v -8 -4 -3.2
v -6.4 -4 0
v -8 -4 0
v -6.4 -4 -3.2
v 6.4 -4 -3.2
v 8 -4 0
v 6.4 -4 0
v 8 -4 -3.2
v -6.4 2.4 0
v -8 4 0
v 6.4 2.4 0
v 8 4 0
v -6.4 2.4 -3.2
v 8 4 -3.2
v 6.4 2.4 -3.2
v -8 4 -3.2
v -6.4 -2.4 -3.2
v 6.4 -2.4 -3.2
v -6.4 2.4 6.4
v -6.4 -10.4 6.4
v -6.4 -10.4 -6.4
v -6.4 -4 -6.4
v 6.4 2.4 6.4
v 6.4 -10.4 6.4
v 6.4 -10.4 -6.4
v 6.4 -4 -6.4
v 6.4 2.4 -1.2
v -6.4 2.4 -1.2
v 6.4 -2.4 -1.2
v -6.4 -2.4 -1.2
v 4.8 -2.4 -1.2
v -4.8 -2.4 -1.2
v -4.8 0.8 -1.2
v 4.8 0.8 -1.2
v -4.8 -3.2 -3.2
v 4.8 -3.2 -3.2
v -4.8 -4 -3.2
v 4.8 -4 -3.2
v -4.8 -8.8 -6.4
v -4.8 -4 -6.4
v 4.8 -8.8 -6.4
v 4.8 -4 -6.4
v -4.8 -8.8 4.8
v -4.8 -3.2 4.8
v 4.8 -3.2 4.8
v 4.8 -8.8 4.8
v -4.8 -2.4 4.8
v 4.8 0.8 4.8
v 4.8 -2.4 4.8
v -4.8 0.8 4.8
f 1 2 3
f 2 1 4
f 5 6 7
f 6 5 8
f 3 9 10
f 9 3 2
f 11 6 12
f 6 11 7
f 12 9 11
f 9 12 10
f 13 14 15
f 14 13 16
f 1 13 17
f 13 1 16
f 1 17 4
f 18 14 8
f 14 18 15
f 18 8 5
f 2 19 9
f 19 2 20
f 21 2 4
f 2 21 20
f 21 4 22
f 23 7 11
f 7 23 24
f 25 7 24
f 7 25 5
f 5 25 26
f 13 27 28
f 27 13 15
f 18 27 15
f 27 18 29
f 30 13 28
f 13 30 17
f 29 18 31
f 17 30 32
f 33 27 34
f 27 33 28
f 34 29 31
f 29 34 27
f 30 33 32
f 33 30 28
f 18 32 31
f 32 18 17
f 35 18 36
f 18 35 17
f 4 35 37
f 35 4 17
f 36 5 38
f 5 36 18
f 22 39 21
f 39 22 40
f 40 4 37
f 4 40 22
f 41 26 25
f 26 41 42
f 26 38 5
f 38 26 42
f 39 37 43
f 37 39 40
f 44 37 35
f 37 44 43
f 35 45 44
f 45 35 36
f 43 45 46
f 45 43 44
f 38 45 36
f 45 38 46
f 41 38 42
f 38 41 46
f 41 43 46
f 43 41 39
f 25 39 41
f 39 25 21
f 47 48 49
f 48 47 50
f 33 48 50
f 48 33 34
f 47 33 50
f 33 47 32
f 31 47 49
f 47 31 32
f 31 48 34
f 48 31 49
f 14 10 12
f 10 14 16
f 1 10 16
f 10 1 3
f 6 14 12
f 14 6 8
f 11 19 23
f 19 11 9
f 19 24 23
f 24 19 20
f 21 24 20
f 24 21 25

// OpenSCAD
// file: ../p/rect3.scad
use <../lib.scad>
function ldraw_lib__rect3() = [
// 0 Rectangle with 3 Edges
// 0 Name: rect3.dat
// 0 Author: Mark Kennedy [mkennedy]
// 0 !LDRAW_ORG Primitive UPDATE 2010-01
// 0 !LICENSE Licensed under CC BY 2.0 and CC BY 4.0 : see CAreadme.txt
// 
// 0 BFC CERTIFY CCW
  [0,"BFC","CERTIFY"],
  [0,"BFC","CCW"],
// 
// 0 !HISTORY 2003-08-01 [PTadmin] Official Update 2003-02
// 0 !HISTORY 2007-06-24 [PTadmin] Header formatted for Contributor Agreement
// 0 !HISTORY 2008-07-01 [PTadmin] Official Update 2008-01
// 0 !HISTORY 2010-01-17 [mikeheide] Change winding to CCW
// 0 !HISTORY 2010-04-05 [PTadmin] Official Update 2010-01
// 
// 
// 2 24 1 0 1 -1 0 1
  [2,24,1,0,1,-1,0,1],
// 2 24 1 0 1 1 0 -1
  [2,24,1,0,1,1,0,-1],
// 2 24 -1 0 1 -1 0 -1
  [2,24,-1,0,1,-1,0,-1],
// 4 16 -1 0 1 -1 0 -1 1 0 -1 1 0 1
  [4,16,-1,0,1,-1,0,-1,1,0,-1,1,0,1],
// 0 //
];
module ldraw_lib__rect3(step=0, col=false, unit=2/5, alt=false, line=0.2, solid=!$preview)
    makepoly(ldraw_lib__rect3(), step=step, col=col, unit=unit, alt=alt, line=line, solid=solid);
ldraw_lib__rect3(line=0.2);
// file: ../p/rect.scad
use <../lib.scad>
function ldraw_lib__rect() = [
// 0 Rectangle
// 0 Name: rect.dat
// 0 Author: James Jessiman
// 0 !LDRAW_ORG Primitive UPDATE 2010-01
// 0 !LICENSE Licensed under CC BY 2.0 and CC BY 4.0 : see CAreadme.txt
// 
// 0 BFC CERTIFY CCW
  [0,"BFC","CERTIFY"],
  [0,"BFC","CCW"],
// 
// 0 !HISTORY 2002-04-05 [hafhead] Added BFC statement
// 0 !HISTORY 2002-04-25 [PTadmin] Official Update 2002-02
// 0 !HISTORY 2007-06-24 [PTadmin] Header formatted for Contributor Agreement
// 0 !HISTORY 2008-07-01 [PTadmin] Official Update 2008-01
// 0 !HISTORY 2010-01-17 [mikeheide] changed winding to CCW
// 0 !HISTORY 2010-04-05 [PTadmin] Official Update 2010-01
// 
// 
// 2 24 1 0 1 -1 0 1
  [2,24,1,0,1,-1,0,1],
// 2 24 -1 0 1 -1 0 -1
  [2,24,-1,0,1,-1,0,-1],
// 2 24 -1 0 -1 1 0 -1
  [2,24,-1,0,-1,1,0,-1],
// 2 24 1 0 -1 1 0 1
  [2,24,1,0,-1,1,0,1],
// 4 16 -1 0 1 -1 0 -1 1 0 -1 1 0 1
  [4,16,-1,0,1,-1,0,-1,1,0,-1,1,0,1],
// 0
];
module ldraw_lib__rect(step=0, col=false, unit=2/5, alt=false, line=0.2, solid=!$preview)
    makepoly(ldraw_lib__rect(), step=step, col=col, unit=unit, alt=alt, line=line, solid=solid);
ldraw_lib__rect(line=0.2);
// file: ../p/box5-1.scad
use <../lib.scad>
function ldraw_lib__box5_1() = [
// 0 Box with 5 Faces without 1 Edge
// 0 Name: box5-1.dat
// 0 Author: J.C. Tchang [tchang]
// 0 !LDRAW_ORG Primitive UPDATE 2014-01
// 0 !LICENSE Licensed under CC BY 2.0 and CC BY 4.0 : see CAreadme.txt
// 
// 0 BFC CERTIFY CCW
  [0,"BFC","CERTIFY"],
  [0,"BFC","CCW"],
// 
// 0 !HISTORY 2014-06-21 [PTadmin] Official Update 2014-01
// 
// 
// 2 24 1 1 1 -1 1 1
  [2,24,1,1,1,-1,1,1],
// 2 24 -1 1 1 -1 1 -1
  [2,24,-1,1,1,-1,1,-1],
// 2 24 -1 1 -1 1 1 -1
  [2,24,-1,1,-1,1,1,-1],
// 2 24 1 1 -1 1 1 1
  [2,24,1,1,-1,1,1,1],
// 2 24 1 0 1 -1 0 1
  [2,24,1,0,1,-1,0,1],
// 2 24 -1 0 1 -1 0 -1
  [2,24,-1,0,1,-1,0,-1],
// 2 24 1 0 -1 1 0 1
  [2,24,1,0,-1,1,0,1],
// 2 24 1 0 1 1 1 1
  [2,24,1,0,1,1,1,1],
// 2 24 -1 0 1 -1 1 1
  [2,24,-1,0,1,-1,1,1],
// 2 24 1 0 -1 1 1 -1
  [2,24,1,0,-1,1,1,-1],
// 2 24 -1 0 -1 -1 1 -1
  [2,24,-1,0,-1,-1,1,-1],
// 4 16 -1 1 1 1 1 1 1 1 -1 -1 1 -1
  [4,16,-1,1,1,1,1,1,1,1,-1,-1,1,-1],
// 4 16 -1 1 1 -1 0 1 1 0 1 1 1 1
  [4,16,-1,1,1,-1,0,1,1,0,1,1,1,1],
// 4 16 -1 1 -1 -1 0 -1 -1 0 1 -1 1 1
  [4,16,-1,1,-1,-1,0,-1,-1,0,1,-1,1,1],
// 4 16 1 1 -1 1 0 -1 -1 0 -1 -1 1 -1
  [4,16,1,1,-1,1,0,-1,-1,0,-1,-1,1,-1],
// 4 16 1 1 1 1 0 1 1 0 -1 1 1 -1
  [4,16,1,1,1,1,0,1,1,0,-1,1,1,-1],
];
module ldraw_lib__box5_1(step=0, col=false, unit=2/5, alt=false, line=0.2, solid=!$preview)
    makepoly(ldraw_lib__box5_1(), step=step, col=col, unit=unit, alt=alt, line=line, solid=solid);
ldraw_lib__box5_1(line=0.2);
// file: ../p/box3u2p.scad
use <../lib.scad>
function ldraw_lib__box3u2p() = [
// 0 Box with 3 Faces without 2 Parallel Edges
// 0 Name: box3u2p.dat
// 0 Author: Niels Karsdorp [nielsk]
// 0 !LDRAW_ORG Primitive UPDATE 2012-01
// 0 !LICENSE Licensed under CC BY 2.0 and CC BY 4.0 : see CAreadme.txt
// 
// 0 BFC CERTIFY CCW
  [0,"BFC","CERTIFY"],
  [0,"BFC","CCW"],
// 
// 0 !HISTORY 2003-03-12 [PTadmin] Official Update 2003-01
// 0 !HISTORY 2007-06-24 [PTadmin] Header formatted for Contributor Agreement
// 0 !HISTORY 2008-07-01 [PTadmin] Official Update 2008-01
// 0 !HISTORY 2012-02-16 [Philo] Changed to CCW
// 0 !HISTORY 2012-03-30 [PTadmin] Official Update 2012-01
// 
// 
// 2 24 1 1 1 -1 1 1
  [2,24,1,1,1,-1,1,1],
// 2 24 -1 1 -1 1 1 -1
  [2,24,-1,1,-1,1,1,-1],
// 2 24 1 0 1 -1 0 1
  [2,24,1,0,1,-1,0,1],
// 2 24 -1 0 -1 1 0 -1
  [2,24,-1,0,-1,1,0,-1],
// 2 24 1 1 1 1 1 -1
  [2,24,1,1,1,1,1,-1],
// 2 24 -1 1 1 -1 1 -1
  [2,24,-1,1,1,-1,1,-1],
// 2 24 1 1 1 1 0 1
  [2,24,1,1,1,1,0,1],
// 2 24 1 1 -1 1 0 -1
  [2,24,1,1,-1,1,0,-1],
// 2 24 -1 1 1 -1 0 1
  [2,24,-1,1,1,-1,0,1],
// 2 24 -1 1 -1 -1 0 -1
  [2,24,-1,1,-1,-1,0,-1],
// 4 16 -1 1 -1 -1 1 1 1 1 1 1 1 -1
  [4,16,-1,1,-1,-1,1,1,1,1,1,1,1,-1],
// 4 16 -1 1 1 -1 0 1 1 0 1 1 1 1
  [4,16,-1,1,1,-1,0,1,1,0,1,1,1,1],
// 4 16 1 1 -1 1 0 -1 -1 0 -1 -1 1 -1
  [4,16,1,1,-1,1,0,-1,-1,0,-1,-1,1,-1],
];
module ldraw_lib__box3u2p(step=0, col=false, unit=2/5, alt=false, line=0.2, solid=!$preview)
    makepoly(ldraw_lib__box3u2p(), step=step, col=col, unit=unit, alt=alt, line=line, solid=solid);
ldraw_lib__box3u2p(line=0.2);
// file: ../p/box2-5.scad
use <../lib.scad>
function ldraw_lib__box2_5() = [
// 0 Box with 2 Faces without 5 Edges
// 0 Name: box2-5.dat
// 0 Author: Steffen [Steffen]
// 0 !LDRAW_ORG Primitive UPDATE 2003-03
// 0 !LICENSE Licensed under CC BY 2.0 and CC BY 4.0 : see CAreadme.txt
// 
// 0 BFC CERTIFY CCW
  [0,"BFC","CERTIFY"],
  [0,"BFC","CCW"],
// 
// 0 !HISTORY 2003-12-19 [PTadmin] Official Update 2003-03
// 0 !HISTORY 2007-06-24 [PTadmin] Header formatted for Contributor Agreement
// 0 !HISTORY 2008-07-01 [PTadmin] Official Update 2008-01
// 
// 
// 2 24 1 1 1 -1 1 1
  [2,24,1,1,1,-1,1,1],
// 2 24 1 1 -1 -1 1 -1
  [2,24,1,1,-1,-1,1,-1],
// 2 24 1 -1 1 -1 -1 1
  [2,24,1,-1,1,-1,-1,1],
// 2 24 -1 -1 1 -1 1 1
  [2,24,-1,-1,1,-1,1,1],
// 2 24 1 -1 1 1 1 1
  [2,24,1,-1,1,1,1,1],
// 2 24 -1 1 -1 -1 1 1
  [2,24,-1,1,-1,-1,1,1],
// 2 24 1 1 -1 1 1 1
  [2,24,1,1,-1,1,1,1],
// 4 16 1 1 1 1 1 -1 -1 1 -1 -1 1 1
  [4,16,1,1,1,1,1,-1,-1,1,-1,-1,1,1],
// 4 16 1 1 1 -1 1 1 -1 -1 1 1 -1 1
  [4,16,1,1,1,-1,1,1,-1,-1,1,1,-1,1],
// 0
];
module ldraw_lib__box2_5(step=0, col=false, unit=2/5, alt=false, line=0.2, solid=!$preview)
    makepoly(ldraw_lib__box2_5(), step=step, col=col, unit=unit, alt=alt, line=line, solid=solid);
ldraw_lib__box2_5(line=0.2);
// file: s/19727s01.scad
use <../../lib.scad>
use <../../p/box2-5.scad>
use <../../p/box3u2p.scad>
use <../../p/box5-1.scad>
use <../../p/rect.scad>
use <../../p/rect3.scad>
function ldraw_lib__s__19727s01() = [
// 0 ~Plate  1 x  2 with Cube without Front
// 0 Name: s\19727s01.dat
// 0 Author: Merlijn Wissink [legolijntje]
// 0 !LDRAW_ORG Subpart UPDATE 2016-01
// 0 !LICENSE Licensed under CC BY 2.0 and CC BY 4.0 : see CAreadme.txt
// 
// 0 BFC CERTIFY CCW
  [0,"BFC","CERTIFY"],
  [0,"BFC","CCW"],
// 
// 0 !HISTORY 2016-03-18 {LEGO Digital Designer} Original part shape
// 0 !HISTORY 2016-06-18 [legolijntje] File preparation for LDraw Parts Tracker
// 0 !HISTORY 2016-12-31 [PTadmin] Official Update 2016-01
// 
// 
// 1 16 -18 4 -10 0 0 2 4 0 0 0 1 0 rect3.dat
  [1,16,-18,4,-10,0,0,2,4,0,0,0,1,0, ldraw_lib__rect3()],
// 1 16 18 4 -10 0 0 -2 -4 0 0 0 1 0 rect3.dat
  [1,16,18,4,-10,0,0,-2,-4,0,0,0,1,0, ldraw_lib__rect3()],
// 4 16 -20 0 10 -20 0 -10 -16 0 -10 -16 0 6
  [4,16,-20,0,10,-20,0,-10,-16,0,-10,-16,0,6],
// 4 16 16 0 -10 20 0 -10 20 0 10 16 0 6
  [4,16,16,0,-10,20,0,-10,20,0,10,16,0,6],
// 4 16 -16 0 6 16 0 6 20 0 10 -20 0 10
  [4,16,-16,0,6,16,0,6,20,0,10,-20,0,10],
// 4 16 20 8 10 16 8 6 -16 8 6 -20 8 10
  [4,16,20,8,10,16,8,6,-16,8,6,-20,8,10],
// 4 16 -20 8 -10 -20 8 10 -16 8 6 -16 8 -6
  [4,16,-20,8,-10,-20,8,10,-16,8,6,-16,8,-6],
// 3 16 -20 8 -10 -16 8 -6 -16 8 -10
  [3,16,-20,8,-10,-16,8,-6,-16,8,-10],
// 4 16 16 8 6 20 8 10 20 8 -10 16 8 -6
  [4,16,16,8,6,20,8,10,20,8,-10,16,8,-6],
// 3 16 16 8 -6 20 8 -10 16 8 -10
  [3,16,16,8,-6,20,8,-10,16,8,-10],
// 4 16 -16 -16 -26 -16 -16 6 -16 0 6 -16 0 -10
  [4,16,-16,-16,-26,-16,-16,6,-16,0,6,-16,0,-10],
// 4 16 -16 0 -10 -16 8 -10 -16 16 -26 -16 -16 -26
  [4,16,-16,0,-10,-16,8,-10,-16,16,-26,-16,-16,-26],
// 3 16 -16 16 -26 -16 8 -10 -16 16 -10
  [3,16,-16,16,-26,-16,8,-10,-16,16,-10],
// 4 16 16 0 6 16 -16 6 16 -16 -26 16 0 -10
  [4,16,16,0,6,16,-16,6,16,-16,-26,16,0,-10],
// 4 16 16 16 -26 16 8 -10 16 0 -10 16 -16 -26
  [4,16,16,16,-26,16,8,-10,16,0,-10,16,-16,-26],
// 3 16 16 8 -10 16 16 -26 16 16 -10
  [3,16,16,8,-10,16,16,-26,16,16,-10],
// 1 16 0 5.5 6 16 0 0 0 0 -2.5 0 1 0 rect.dat
  [1,16,0,5.5,6,16,0,0,0,0,-2.5,0,1,0, ldraw_lib__rect()],
// 1 16 16 5.5 0 0 1 0 2.5 0 0 0 0 -6 rect.dat
  [1,16,16,5.5,0,0,1,0,2.5,0,0,0,0,-6, ldraw_lib__rect()],
// 1 16 -16 5.5 0 0 -1 0 0 0 -2.5 6 0 0 rect.dat
  [1,16,-16,5.5,0,0,-1,0,0,0,-2.5,6,0,0, ldraw_lib__rect()],
// 3 16 16 3 -6 16 8 -6 12 3 -6
  [3,16,16,3,-6,16,8,-6,12,3,-6],
// 3 16 -16 8 -6 -16 3 -6 -12 3 -6
  [3,16,-16,8,-6,-16,3,-6,-12,3,-6],
// 4 16 -16 3 6 16 3 6 12 3 2 -12 3 2
  [4,16,-16,3,6,16,3,6,12,3,2,-12,3,2],
// 4 16 16 3 6 16 3 -6 12 3 -6 12 3 2
  [4,16,16,3,6,16,3,-6,12,3,-6,12,3,2],
// 4 16 -12 3 2 -12 3 -6 -16 3 -6 -16 3 6
  [4,16,-12,3,2,-12,3,-6,-16,3,-6,-16,3,6],
// 4 16 12 3 -6 16 8 -6 -16 8 -6 -12 3 -6
  [4,16,12,3,-6,16,8,-6,-16,8,-6,-12,3,-6],
// 4 16 -16 8 -6 16 8 -6 12 8 -8 -12 8 -8
  [4,16,-16,8,-6,16,8,-6,12,8,-8,-12,8,-8],
// 4 16 -16 8 -10 -16 8 -6 -12 8 -8 -12 8 -10
  [4,16,-16,8,-10,-16,8,-6,-12,8,-8,-12,8,-10],
// 4 16 12 8 -8 16 8 -6 16 8 -10 12 8 -10
  [4,16,12,8,-8,16,8,-6,16,8,-10,12,8,-10],
// 4 16 -12 16 -22 -16 16 -26 -16 16 -10 -12 16 -10
  [4,16,-12,16,-22,-16,16,-26,-16,16,-10,-12,16,-10],
// 1 16 -14 12 -10 2 0 0 0 0 4 0 -1 0 rect.dat
  [1,16,-14,12,-10,2,0,0,0,0,4,0,-1,0, ldraw_lib__rect()],
// 4 16 16 16 -10 16 16 -26 12 16 -22 12 16 -10
  [4,16,16,16,-10,16,16,-26,12,16,-22,12,16,-10],
// 1 16 14 12 -10 2 0 0 0 0 4 0 -1 0 rect.dat
  [1,16,14,12,-10,2,0,0,0,0,4,0,-1,0, ldraw_lib__rect()],
// 4 16 -12 16 -22 -12 16 -10 -12 8 -10 -12 -12 -22
  [4,16,-12,16,-22,-12,16,-10,-12,8,-10,-12,-12,-22],
// 4 16 -12 -12 -22 -12 8 -10 -12 8 -8 -12 -12 -8
  [4,16,-12,-12,-22,-12,8,-10,-12,8,-8,-12,-12,-8],
// 1 16 0 -2 -8 0 0 12 10 0 0 0 1 0 rect.dat
  [1,16,0,-2,-8,0,0,12,10,0,0,0,1,0, ldraw_lib__rect()],
// 1 16 0 -12 -15 0 0 12 0 -1 0 7 0 0 rect.dat
  [1,16,0,-12,-15,0,0,12,0,-1,0,7,0,0, ldraw_lib__rect()],
// 4 16 12 -12 -8 12 8 -8 12 8 -10 12 -12 -22
  [4,16,12,-12,-8,12,8,-8,12,8,-10,12,-12,-22],
// 4 16 12 16 -22 12 -12 -22 12 8 -10 12 16 -10
  [4,16,12,16,-22,12,-12,-22,12,8,-10,12,16,-10],
// 1 16 0 2 -22 12 0 0 0 0 14 0 -1 0 rect3.dat
  [1,16,0,2,-22,12,0,0,0,0,14,0,-1,0, ldraw_lib__rect3()],
// 4 16 -16 16 -26 -12 16 -22 12 16 -22 16 16 -26
  [4,16,-16,16,-26,-12,16,-22,12,16,-22,16,16,-26],
// 2 24 -16 -16 -26 -16 16 -26
  [2,24,-16,-16,-26,-16,16,-26],
// 2 24 -16 16 -26 16 16 -26
  [2,24,-16,16,-26,16,16,-26],
// 2 24 16 16 -26 16 -16 -26
  [2,24,16,16,-26,16,-16,-26],
// 2 24 16 16 -26 16 16 -10
  [2,24,16,16,-26,16,16,-10],
// 2 24 -16 16 -10 -16 16 -26
  [2,24,-16,16,-10,-16,16,-26],
// 2 24 -12 16 -10 -12 16 -22
  [2,24,-12,16,-10,-12,16,-22],
// 2 24 12 16 -22 12 16 -10
  [2,24,12,16,-22,12,16,-10],
// 2 24 16 0 -10 16 0 6
  [2,24,16,0,-10,16,0,6],
// 2 24 -16 0 6 -16 0 -10
  [2,24,-16,0,6,-16,0,-10],
// 2 24 -12 8 -8 -12 8 -10
  [2,24,-12,8,-8,-12,8,-10],
// 2 24 12 8 -8 12 8 -10
  [2,24,12,8,-8,12,8,-10],
// 2 24 -16 8 -6 16 8 -6
  [2,24,-16,8,-6,16,8,-6],
// 2 24 -12 3 -6 -16 3 -6
  [2,24,-12,3,-6,-16,3,-6],
// 2 24 12 3 -6 16 3 -6
  [2,24,12,3,-6,16,3,-6],
// 0 BFC INVERTNEXT
  [0,"BFC","INVERTNEXT"],
// 1 16 0 3 -2 12 0 0 0 -15 0 0 0 4 box5-1.dat
  [1,16,0,3,-2,12,0,0,0,-15,0,0,0,4, ldraw_lib__box5_1()],
// 1 16 0 4 -10 0 0 -20 -4 0 0 0 20 0 box3u2p.dat
  [1,16,0,4,-10,0,0,-20,-4,0,0,0,20,0, ldraw_lib__box3u2p()],
// 1 16 0 -8 -10 16 0 0 0 0 -8 0 16 0 box2-5.dat
  [1,16,0,-8,-10,16,0,0,0,0,-8,0,16,0, ldraw_lib__box2_5()],
];
module ldraw_lib__s__19727s01(step=0, col=false, unit=2/5, alt=false, line=0.2, solid=!$preview)
    makepoly(ldraw_lib__s__19727s01(), step=step, col=col, unit=unit, alt=alt, line=line, solid=solid);
ldraw_lib__s__19727s01(line=0.2);
// main file
use <../lib.scad>
use <s/19727s01.scad>
function ldraw_lib__19727() = [
// 0 Plate  1 x  2 with Cube
// 0 Name: 19727.dat
// 0 Author: Merlijn Wissink [legolijntje]
// 0 !LDRAW_ORG Part UPDATE 2016-01
// 0 !LICENSE Licensed under CC BY 2.0 and CC BY 4.0 : see CAreadme.txt
// 
// 0 BFC CERTIFY CCW
  [0,"BFC","CERTIFY"],
  [0,"BFC","CCW"],
// 
// 0 !KEYWORDS Minecraft
// 
// 0 !HISTORY 2016-03-18 {LEGO Digital Designer} Original part shape
// 0 !HISTORY 2016-06-18 [legolijntje] File preparation for LDraw Parts Tracker
// 0 !HISTORY 2016-12-31 [PTadmin] Official Update 2016-01
// 
// 
// 1 16 0 0 0 1 0 0 0 1 0 0 0 1 s\19727s01.dat
  [1,16,0,0,0,1,0,0,0,1,0,0,0,1, ldraw_lib__s__19727s01()],
// 4 16 -16 16 -26 16 16 -26 16 -16 -26 -16 -16 -26
  [4,16,-16,16,-26,16,16,-26,16,-16,-26,-16,-16,-26],
];
module ldraw_lib__19727(step=0, col=false, unit=2/5, alt=false, line=0.2, solid=!$preview)
    makepoly(ldraw_lib__19727(), step=step, col=col, unit=unit, alt=alt, line=line, solid=solid);
ldraw_lib__19727(line=0.2);
